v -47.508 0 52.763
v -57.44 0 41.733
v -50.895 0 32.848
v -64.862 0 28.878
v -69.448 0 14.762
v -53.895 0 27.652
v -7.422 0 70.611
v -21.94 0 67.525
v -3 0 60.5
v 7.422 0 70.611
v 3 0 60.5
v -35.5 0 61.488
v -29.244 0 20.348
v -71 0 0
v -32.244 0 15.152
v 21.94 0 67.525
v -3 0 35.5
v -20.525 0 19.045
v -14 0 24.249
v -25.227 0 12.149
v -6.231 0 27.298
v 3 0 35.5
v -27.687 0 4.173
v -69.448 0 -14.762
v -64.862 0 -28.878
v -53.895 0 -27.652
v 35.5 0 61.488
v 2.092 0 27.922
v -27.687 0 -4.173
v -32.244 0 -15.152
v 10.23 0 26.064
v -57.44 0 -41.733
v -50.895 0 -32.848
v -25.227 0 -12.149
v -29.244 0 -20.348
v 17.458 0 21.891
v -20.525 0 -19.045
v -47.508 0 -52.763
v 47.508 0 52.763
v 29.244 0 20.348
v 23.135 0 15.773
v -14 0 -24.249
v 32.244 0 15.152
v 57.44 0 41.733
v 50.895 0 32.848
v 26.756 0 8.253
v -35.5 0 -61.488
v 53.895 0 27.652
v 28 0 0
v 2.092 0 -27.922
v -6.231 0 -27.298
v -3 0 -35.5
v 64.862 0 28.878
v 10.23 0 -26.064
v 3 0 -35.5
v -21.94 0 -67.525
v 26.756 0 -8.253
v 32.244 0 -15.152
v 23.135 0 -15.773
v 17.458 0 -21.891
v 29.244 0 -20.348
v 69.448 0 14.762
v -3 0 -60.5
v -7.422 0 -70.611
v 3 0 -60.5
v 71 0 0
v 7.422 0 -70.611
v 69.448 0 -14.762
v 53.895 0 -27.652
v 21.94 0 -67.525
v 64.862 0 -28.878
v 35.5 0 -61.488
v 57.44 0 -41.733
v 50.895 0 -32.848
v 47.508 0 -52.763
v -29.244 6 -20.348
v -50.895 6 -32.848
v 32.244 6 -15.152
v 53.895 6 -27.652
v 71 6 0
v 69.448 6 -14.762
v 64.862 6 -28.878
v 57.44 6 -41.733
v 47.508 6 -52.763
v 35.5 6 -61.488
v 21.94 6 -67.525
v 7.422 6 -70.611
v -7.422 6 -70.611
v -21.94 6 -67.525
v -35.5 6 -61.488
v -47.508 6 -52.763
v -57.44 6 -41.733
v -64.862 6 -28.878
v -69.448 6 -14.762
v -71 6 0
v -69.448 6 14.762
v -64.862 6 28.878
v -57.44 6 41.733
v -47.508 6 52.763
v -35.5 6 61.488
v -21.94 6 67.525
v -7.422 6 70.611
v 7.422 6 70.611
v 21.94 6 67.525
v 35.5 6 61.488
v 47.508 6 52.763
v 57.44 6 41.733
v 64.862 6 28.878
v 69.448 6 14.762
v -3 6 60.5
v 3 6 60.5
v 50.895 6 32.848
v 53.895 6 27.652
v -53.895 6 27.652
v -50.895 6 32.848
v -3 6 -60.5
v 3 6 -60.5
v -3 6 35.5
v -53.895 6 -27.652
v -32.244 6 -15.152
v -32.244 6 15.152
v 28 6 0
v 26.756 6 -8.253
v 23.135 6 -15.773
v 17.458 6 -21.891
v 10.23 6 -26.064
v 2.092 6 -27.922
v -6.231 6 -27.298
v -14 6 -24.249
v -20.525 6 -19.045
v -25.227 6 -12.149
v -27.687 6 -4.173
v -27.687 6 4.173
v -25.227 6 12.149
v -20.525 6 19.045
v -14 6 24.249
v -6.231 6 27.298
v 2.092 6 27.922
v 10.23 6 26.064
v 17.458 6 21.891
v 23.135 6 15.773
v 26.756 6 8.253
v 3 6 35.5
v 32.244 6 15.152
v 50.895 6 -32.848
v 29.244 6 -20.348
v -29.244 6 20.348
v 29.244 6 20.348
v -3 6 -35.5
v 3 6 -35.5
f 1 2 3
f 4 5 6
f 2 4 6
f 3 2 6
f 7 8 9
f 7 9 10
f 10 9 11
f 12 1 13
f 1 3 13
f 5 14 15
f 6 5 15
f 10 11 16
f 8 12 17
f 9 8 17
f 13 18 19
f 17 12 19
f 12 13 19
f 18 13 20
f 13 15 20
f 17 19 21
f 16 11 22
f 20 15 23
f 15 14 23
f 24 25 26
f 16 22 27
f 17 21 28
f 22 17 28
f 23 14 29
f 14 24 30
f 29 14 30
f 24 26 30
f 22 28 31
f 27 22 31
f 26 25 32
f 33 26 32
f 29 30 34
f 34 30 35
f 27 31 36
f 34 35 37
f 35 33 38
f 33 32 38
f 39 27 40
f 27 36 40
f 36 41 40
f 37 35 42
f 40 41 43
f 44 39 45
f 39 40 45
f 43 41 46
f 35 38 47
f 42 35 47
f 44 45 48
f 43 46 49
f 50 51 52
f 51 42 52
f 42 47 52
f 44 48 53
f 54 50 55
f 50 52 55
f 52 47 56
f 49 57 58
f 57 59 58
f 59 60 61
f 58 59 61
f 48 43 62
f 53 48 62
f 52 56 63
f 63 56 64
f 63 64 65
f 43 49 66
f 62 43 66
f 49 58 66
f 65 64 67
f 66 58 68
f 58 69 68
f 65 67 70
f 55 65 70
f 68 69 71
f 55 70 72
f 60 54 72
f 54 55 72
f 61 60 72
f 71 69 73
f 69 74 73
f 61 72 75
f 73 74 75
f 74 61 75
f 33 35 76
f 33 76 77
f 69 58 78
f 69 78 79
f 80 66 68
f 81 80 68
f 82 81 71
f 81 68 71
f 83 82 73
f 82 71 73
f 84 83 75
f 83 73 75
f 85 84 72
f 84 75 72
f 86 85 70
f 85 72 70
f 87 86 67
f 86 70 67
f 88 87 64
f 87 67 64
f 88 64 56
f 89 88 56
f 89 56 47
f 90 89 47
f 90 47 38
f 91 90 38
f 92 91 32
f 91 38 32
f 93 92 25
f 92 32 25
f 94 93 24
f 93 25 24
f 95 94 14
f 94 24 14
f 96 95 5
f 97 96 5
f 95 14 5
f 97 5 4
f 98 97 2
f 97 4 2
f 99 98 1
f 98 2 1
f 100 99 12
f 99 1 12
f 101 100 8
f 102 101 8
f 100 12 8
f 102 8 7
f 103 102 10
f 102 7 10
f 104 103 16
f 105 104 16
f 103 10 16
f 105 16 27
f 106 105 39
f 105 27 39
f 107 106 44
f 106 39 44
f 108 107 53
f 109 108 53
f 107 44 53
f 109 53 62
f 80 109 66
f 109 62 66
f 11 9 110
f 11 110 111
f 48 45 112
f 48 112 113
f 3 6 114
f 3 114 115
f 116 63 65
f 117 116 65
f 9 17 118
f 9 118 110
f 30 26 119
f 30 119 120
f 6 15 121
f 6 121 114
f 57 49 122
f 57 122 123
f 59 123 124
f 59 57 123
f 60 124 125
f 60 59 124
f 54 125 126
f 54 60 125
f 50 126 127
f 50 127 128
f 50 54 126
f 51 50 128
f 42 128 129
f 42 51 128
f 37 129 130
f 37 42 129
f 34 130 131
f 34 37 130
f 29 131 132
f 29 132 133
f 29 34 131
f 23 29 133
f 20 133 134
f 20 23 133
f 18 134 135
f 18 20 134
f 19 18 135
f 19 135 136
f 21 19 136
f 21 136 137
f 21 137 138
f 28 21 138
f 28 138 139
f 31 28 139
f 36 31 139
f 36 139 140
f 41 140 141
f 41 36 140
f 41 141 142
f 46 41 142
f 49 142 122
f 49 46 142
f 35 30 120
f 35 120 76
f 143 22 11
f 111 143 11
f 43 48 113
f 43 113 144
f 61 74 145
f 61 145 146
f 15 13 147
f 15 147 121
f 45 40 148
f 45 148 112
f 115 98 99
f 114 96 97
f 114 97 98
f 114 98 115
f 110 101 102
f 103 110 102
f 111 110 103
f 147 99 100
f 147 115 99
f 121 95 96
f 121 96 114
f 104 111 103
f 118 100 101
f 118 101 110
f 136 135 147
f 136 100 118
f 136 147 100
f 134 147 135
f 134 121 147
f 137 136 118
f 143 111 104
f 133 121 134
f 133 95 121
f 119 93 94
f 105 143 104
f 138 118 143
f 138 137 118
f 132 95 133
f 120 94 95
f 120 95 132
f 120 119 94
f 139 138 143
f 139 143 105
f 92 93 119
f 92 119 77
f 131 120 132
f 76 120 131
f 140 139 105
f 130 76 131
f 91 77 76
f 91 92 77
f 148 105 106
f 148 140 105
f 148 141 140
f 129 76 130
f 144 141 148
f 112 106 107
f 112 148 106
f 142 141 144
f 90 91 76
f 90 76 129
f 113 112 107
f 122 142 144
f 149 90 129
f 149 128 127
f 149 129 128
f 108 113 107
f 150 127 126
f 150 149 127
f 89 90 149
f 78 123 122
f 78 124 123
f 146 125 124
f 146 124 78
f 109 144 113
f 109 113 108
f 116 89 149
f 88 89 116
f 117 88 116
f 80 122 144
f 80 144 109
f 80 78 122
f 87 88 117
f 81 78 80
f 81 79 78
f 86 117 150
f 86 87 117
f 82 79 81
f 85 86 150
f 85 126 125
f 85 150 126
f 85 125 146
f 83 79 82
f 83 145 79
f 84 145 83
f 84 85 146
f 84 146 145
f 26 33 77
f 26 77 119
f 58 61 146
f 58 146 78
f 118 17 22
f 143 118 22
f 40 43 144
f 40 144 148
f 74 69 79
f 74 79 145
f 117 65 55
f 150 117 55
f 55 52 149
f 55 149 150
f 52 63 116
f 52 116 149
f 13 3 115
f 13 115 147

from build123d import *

# Parameters (mm, degrees)
ESQUISSE1_R             = 71
ESQUISSE1_R_2           = 28
BOSS_EXTRU_1_DEPTH      = 6
ESQUISSE2_W             = 6
ESQUISSE2_H             = 25
ENL_V_MAT_EXTRU_1_DEPTH = 10


with BuildPart() as part:
    # Esquisse1 → Boss.-Extru.1 (new body)
    with BuildSketch(Plane(origin=(0, 0, 0), x_dir=(1, 0, 0), z_dir=(0, 1, 0))):
        Circle(ESQUISSE1_R)
        Circle(ESQUISSE1_R_2, mode=Mode.SUBTRACT)
    extrude(amount=BOSS_EXTRU_1_DEPTH)

    # Esquisse2 → Enlèv. mat.-Extru.1 (cut)
    with BuildSketch(Plane.XZ):
        Polygon((50.894536929, -32.848076211), (29.243901834, -20.348076211), (32.243901834, -15.151923789), (53.894536929, -27.651923789), align=None)
        with Locations((0, -48)):
            Rectangle(ESQUISSE2_W, ESQUISSE2_H)
        Polygon((53.894536929, 27.651923789), (32.243901834, 15.151923789), (29.243901834, 20.348076211), (50.894536929, 32.848076211), align=None)
        with Locations((0, 48)):
            Rectangle(ESQUISSE2_W, ESQUISSE2_H)
        Polygon((-50.894536929, 32.848076211), (-29.243901834, 20.348076211), (-32.243901834, 15.151923789), (-53.894536929, 27.651923789), align=None)
        Polygon((-53.894536929, -27.651923789), (-32.243901834, -15.151923789), (-29.243901834, -20.348076211), (-50.894536929, -32.848076211), align=None)
    extrude(amount=-ENL_V_MAT_EXTRU_1_DEPTH, mode=Mode.SUBTRACT)


solid = part.part
